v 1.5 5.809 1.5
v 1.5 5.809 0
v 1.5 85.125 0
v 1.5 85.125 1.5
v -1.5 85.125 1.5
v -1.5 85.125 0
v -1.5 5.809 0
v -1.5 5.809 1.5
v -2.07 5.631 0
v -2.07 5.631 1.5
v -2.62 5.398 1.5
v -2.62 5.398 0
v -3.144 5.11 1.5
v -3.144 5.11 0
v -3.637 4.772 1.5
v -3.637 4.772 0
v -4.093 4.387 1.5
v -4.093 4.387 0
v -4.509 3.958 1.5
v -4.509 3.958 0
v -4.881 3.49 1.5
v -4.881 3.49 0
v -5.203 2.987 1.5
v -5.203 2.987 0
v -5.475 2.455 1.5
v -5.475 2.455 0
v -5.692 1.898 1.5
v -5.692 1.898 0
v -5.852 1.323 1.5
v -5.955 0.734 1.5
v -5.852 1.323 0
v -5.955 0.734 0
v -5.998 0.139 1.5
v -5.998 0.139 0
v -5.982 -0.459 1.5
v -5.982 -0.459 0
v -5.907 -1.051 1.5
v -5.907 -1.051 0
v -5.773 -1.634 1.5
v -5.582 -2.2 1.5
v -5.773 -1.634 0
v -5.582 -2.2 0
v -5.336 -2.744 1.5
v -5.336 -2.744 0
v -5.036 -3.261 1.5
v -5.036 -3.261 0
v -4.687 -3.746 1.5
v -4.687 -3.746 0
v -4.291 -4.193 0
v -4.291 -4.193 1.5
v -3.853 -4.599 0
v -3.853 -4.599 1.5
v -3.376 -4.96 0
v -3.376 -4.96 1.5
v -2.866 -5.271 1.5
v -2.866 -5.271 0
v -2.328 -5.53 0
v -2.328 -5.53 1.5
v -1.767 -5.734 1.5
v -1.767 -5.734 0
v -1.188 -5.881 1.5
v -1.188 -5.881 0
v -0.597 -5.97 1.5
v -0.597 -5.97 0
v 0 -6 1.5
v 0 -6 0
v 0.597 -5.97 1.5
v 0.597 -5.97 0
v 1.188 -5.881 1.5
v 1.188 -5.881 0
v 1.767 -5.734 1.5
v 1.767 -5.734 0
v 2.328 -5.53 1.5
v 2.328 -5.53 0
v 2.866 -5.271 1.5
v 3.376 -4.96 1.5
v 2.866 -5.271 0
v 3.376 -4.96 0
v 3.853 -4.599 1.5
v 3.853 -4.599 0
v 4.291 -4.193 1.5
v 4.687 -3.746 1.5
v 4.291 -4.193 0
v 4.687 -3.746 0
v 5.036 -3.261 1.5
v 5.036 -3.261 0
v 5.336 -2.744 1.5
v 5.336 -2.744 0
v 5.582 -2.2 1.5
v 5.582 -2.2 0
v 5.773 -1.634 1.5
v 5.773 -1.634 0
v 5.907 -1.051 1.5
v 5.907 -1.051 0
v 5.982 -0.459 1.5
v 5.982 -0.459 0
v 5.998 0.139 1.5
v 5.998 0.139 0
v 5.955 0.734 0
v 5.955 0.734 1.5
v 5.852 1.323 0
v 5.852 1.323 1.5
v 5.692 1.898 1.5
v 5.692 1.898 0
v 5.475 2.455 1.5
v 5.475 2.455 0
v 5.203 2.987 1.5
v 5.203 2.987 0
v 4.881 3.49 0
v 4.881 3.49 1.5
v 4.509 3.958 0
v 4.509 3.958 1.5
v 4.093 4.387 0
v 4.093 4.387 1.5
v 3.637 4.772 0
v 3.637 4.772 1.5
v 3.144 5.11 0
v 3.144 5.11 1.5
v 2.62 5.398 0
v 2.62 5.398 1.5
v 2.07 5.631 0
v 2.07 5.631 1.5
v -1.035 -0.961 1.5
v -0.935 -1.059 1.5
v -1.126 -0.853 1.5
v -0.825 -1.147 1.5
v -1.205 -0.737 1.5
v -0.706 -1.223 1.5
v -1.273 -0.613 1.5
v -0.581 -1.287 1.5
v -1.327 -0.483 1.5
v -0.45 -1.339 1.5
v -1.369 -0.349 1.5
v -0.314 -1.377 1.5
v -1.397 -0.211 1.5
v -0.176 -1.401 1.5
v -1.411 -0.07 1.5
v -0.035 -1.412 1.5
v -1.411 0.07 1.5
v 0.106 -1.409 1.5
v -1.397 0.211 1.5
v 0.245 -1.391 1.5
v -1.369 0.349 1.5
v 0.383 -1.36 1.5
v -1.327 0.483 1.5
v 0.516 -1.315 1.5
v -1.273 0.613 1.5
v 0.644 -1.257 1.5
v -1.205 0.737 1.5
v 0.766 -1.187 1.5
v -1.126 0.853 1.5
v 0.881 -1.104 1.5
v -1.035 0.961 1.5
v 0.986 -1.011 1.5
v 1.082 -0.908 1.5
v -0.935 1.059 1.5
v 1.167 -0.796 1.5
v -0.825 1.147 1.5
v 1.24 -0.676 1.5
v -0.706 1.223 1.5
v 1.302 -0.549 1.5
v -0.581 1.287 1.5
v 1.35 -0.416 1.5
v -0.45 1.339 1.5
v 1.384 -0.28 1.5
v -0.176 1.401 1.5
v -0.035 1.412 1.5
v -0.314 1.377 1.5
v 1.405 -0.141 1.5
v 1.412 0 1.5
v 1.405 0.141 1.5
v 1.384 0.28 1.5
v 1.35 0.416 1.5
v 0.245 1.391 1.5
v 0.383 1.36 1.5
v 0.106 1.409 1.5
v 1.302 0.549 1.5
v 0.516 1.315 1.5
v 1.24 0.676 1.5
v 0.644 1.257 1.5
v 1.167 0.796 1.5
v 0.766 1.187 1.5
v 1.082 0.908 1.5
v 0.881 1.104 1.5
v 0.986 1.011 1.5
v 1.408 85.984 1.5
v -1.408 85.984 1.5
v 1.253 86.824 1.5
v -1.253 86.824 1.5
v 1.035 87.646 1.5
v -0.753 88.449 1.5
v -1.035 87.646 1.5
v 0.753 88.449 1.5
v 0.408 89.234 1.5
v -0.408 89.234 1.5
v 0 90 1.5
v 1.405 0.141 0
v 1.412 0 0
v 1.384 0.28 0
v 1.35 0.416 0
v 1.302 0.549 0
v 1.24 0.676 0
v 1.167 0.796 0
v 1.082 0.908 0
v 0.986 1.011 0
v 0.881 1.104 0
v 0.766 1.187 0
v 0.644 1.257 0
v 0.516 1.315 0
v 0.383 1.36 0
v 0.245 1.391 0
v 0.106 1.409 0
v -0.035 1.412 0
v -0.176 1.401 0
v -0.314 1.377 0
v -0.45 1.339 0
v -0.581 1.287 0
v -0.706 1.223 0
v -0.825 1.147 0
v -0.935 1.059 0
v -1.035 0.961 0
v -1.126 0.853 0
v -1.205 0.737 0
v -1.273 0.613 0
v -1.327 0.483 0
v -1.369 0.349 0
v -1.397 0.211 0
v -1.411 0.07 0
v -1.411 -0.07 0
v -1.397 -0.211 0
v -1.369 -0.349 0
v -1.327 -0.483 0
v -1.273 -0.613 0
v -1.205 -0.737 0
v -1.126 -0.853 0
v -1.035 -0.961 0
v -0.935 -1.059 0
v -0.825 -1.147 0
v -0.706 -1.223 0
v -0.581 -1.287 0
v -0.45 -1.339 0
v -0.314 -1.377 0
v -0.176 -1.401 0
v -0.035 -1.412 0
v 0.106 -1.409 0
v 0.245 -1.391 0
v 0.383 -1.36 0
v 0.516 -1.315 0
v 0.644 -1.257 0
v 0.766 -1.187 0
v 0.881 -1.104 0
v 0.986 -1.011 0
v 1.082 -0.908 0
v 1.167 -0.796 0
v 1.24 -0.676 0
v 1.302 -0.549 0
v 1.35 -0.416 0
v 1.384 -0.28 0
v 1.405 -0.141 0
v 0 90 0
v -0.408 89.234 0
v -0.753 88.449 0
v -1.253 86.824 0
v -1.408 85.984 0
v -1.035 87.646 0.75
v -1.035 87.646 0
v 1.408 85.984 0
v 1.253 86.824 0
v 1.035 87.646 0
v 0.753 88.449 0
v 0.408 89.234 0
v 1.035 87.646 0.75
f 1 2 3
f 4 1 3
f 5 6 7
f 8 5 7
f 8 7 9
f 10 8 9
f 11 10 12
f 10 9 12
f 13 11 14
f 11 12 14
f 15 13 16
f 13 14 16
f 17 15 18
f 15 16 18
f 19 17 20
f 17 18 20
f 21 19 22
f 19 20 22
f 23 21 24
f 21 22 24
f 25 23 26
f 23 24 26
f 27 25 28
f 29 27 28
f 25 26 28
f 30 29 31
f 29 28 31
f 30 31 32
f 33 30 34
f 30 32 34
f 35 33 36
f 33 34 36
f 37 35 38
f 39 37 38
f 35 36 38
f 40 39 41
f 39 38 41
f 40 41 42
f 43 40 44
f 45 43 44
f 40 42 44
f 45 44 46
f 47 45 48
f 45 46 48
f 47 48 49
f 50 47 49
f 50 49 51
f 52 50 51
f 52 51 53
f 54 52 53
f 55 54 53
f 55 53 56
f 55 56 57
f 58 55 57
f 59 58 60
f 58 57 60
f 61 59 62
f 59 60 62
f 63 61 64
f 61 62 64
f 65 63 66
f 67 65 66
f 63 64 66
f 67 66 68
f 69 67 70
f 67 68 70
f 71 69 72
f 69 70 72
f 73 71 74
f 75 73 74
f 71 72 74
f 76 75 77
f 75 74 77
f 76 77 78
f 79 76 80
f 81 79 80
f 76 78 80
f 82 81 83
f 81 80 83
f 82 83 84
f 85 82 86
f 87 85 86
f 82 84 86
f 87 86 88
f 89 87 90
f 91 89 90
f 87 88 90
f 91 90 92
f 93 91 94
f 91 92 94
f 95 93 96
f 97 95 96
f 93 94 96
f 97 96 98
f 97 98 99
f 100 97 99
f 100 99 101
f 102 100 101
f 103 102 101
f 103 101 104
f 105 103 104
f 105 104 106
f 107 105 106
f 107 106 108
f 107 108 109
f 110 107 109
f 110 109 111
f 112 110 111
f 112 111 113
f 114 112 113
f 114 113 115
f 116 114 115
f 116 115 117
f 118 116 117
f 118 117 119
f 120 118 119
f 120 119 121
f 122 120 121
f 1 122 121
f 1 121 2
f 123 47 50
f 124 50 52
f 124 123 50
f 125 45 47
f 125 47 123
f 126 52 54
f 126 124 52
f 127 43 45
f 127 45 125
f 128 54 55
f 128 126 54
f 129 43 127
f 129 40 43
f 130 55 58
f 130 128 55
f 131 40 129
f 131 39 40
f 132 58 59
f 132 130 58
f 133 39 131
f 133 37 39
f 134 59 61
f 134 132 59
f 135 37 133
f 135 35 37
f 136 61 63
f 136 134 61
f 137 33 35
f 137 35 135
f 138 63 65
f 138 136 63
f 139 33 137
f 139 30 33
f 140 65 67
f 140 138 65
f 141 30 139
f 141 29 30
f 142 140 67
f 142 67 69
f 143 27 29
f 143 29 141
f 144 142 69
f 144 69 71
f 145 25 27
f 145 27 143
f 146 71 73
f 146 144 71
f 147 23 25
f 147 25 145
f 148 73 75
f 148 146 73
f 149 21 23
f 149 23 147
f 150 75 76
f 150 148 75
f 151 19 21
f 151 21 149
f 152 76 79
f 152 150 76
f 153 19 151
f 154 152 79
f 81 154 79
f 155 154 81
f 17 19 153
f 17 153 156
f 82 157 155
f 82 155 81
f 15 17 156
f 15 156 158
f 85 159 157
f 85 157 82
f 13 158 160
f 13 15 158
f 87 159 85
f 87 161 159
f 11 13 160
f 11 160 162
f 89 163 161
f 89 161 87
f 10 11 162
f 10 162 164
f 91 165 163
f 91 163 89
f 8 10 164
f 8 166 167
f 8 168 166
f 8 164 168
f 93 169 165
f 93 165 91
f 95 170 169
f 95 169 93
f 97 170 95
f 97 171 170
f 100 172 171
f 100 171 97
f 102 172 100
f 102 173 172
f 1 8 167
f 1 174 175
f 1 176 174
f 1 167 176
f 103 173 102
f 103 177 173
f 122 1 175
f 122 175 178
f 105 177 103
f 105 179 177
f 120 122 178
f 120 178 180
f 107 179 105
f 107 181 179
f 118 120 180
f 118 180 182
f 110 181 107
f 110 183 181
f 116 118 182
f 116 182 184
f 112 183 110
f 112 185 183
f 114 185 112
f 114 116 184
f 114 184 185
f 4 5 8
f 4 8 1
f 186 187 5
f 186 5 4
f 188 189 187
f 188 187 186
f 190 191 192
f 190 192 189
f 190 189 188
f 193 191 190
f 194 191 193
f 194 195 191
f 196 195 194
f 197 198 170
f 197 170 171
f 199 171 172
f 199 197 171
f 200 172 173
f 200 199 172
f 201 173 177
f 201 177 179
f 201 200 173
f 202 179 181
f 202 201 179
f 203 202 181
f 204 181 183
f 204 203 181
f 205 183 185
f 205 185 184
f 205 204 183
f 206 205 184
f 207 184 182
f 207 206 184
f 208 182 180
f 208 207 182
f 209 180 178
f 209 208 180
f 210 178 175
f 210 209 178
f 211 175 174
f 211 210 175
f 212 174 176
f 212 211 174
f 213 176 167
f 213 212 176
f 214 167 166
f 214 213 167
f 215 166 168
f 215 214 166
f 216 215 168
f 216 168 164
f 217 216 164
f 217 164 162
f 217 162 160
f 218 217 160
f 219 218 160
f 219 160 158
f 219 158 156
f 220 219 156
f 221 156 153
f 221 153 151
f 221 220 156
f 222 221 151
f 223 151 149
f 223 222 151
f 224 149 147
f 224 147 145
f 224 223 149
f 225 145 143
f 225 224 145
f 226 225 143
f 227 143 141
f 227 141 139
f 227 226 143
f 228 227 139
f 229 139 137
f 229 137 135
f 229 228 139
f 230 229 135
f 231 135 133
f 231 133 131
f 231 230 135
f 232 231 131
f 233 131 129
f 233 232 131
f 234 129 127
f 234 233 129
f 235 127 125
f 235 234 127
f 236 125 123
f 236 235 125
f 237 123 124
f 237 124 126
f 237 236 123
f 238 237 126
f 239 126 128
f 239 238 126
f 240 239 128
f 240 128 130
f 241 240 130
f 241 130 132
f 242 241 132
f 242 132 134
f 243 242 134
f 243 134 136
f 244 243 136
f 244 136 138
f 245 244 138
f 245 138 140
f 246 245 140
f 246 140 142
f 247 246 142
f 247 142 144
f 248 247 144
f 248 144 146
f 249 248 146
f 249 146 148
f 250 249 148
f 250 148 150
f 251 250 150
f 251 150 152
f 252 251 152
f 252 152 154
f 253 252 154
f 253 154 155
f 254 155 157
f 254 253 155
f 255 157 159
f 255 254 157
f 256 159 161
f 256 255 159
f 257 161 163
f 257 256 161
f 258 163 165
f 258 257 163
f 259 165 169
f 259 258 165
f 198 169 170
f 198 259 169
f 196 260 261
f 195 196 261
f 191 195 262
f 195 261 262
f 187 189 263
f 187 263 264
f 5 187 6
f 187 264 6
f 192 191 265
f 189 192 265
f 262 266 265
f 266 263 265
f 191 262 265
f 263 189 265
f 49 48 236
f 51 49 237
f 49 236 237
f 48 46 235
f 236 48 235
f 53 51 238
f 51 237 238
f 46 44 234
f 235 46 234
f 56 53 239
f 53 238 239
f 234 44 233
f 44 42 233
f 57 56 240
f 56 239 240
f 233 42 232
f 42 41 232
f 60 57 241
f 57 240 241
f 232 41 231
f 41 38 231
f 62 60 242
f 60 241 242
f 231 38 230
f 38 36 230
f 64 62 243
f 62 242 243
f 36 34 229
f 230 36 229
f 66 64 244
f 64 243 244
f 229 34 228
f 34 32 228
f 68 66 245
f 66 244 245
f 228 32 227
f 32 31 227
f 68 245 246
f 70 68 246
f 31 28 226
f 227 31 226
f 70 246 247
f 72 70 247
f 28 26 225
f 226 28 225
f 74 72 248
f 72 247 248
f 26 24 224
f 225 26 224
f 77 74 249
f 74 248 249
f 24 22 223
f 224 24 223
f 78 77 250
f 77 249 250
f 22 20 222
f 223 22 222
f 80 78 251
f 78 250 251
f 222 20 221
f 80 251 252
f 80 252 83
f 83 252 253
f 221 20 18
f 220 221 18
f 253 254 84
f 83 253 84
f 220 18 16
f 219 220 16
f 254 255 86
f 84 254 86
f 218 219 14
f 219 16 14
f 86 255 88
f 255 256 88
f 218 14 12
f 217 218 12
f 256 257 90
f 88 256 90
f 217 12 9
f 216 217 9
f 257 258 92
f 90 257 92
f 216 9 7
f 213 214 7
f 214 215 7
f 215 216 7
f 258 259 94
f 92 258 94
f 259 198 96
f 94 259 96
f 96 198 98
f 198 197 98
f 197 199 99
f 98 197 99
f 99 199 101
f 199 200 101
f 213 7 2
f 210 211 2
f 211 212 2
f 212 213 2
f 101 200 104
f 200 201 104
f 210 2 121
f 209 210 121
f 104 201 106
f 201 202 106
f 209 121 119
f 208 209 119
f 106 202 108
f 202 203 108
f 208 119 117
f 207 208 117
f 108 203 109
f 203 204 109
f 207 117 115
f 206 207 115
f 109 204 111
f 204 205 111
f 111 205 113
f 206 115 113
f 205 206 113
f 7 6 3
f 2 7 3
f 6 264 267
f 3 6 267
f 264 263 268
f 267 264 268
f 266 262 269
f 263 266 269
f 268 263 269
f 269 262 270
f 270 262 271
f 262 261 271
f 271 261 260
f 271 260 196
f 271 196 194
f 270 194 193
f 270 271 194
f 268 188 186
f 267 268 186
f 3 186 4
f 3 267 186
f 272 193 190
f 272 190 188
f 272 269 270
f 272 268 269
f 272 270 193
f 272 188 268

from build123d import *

# Parameters (mm, degrees)
SKETCH2_R           = 1.412460089
BOSS_EXTRUDE1_DEPTH = 1.5


with BuildPart() as part:
    # Sketch2 → Boss-Extrude1 (new body)
    with BuildSketch(Plane.XY):
        with BuildLine():
            Line((-1.5, 85.125143236), (-1.5, 5.809475019))
            ThreePointArc((-1.5, 5.809475019), (0, -6), (1.5, 5.809475019))
            Line((1.5, 5.809475019), (1.5, 85.125143236))
            add(Edge.make_bspline(
                [(0, 90), (1.319809251, 87.72856759), (1.5, 85.125143236)],
                knots=[0, 0, 0, 1, 1, 1], degree=2))
            add(Edge.make_bspline(
                [(0, 90), (-1.319809251, 87.72856759), (-1.5, 85.125143236)],
                knots=[0, 0, 0, 1, 1, 1], degree=2))
        make_face()
        Circle(SKETCH2_R, mode=Mode.SUBTRACT)
    extrude(amount=BOSS_EXTRUDE1_DEPTH)


solid = part.part
